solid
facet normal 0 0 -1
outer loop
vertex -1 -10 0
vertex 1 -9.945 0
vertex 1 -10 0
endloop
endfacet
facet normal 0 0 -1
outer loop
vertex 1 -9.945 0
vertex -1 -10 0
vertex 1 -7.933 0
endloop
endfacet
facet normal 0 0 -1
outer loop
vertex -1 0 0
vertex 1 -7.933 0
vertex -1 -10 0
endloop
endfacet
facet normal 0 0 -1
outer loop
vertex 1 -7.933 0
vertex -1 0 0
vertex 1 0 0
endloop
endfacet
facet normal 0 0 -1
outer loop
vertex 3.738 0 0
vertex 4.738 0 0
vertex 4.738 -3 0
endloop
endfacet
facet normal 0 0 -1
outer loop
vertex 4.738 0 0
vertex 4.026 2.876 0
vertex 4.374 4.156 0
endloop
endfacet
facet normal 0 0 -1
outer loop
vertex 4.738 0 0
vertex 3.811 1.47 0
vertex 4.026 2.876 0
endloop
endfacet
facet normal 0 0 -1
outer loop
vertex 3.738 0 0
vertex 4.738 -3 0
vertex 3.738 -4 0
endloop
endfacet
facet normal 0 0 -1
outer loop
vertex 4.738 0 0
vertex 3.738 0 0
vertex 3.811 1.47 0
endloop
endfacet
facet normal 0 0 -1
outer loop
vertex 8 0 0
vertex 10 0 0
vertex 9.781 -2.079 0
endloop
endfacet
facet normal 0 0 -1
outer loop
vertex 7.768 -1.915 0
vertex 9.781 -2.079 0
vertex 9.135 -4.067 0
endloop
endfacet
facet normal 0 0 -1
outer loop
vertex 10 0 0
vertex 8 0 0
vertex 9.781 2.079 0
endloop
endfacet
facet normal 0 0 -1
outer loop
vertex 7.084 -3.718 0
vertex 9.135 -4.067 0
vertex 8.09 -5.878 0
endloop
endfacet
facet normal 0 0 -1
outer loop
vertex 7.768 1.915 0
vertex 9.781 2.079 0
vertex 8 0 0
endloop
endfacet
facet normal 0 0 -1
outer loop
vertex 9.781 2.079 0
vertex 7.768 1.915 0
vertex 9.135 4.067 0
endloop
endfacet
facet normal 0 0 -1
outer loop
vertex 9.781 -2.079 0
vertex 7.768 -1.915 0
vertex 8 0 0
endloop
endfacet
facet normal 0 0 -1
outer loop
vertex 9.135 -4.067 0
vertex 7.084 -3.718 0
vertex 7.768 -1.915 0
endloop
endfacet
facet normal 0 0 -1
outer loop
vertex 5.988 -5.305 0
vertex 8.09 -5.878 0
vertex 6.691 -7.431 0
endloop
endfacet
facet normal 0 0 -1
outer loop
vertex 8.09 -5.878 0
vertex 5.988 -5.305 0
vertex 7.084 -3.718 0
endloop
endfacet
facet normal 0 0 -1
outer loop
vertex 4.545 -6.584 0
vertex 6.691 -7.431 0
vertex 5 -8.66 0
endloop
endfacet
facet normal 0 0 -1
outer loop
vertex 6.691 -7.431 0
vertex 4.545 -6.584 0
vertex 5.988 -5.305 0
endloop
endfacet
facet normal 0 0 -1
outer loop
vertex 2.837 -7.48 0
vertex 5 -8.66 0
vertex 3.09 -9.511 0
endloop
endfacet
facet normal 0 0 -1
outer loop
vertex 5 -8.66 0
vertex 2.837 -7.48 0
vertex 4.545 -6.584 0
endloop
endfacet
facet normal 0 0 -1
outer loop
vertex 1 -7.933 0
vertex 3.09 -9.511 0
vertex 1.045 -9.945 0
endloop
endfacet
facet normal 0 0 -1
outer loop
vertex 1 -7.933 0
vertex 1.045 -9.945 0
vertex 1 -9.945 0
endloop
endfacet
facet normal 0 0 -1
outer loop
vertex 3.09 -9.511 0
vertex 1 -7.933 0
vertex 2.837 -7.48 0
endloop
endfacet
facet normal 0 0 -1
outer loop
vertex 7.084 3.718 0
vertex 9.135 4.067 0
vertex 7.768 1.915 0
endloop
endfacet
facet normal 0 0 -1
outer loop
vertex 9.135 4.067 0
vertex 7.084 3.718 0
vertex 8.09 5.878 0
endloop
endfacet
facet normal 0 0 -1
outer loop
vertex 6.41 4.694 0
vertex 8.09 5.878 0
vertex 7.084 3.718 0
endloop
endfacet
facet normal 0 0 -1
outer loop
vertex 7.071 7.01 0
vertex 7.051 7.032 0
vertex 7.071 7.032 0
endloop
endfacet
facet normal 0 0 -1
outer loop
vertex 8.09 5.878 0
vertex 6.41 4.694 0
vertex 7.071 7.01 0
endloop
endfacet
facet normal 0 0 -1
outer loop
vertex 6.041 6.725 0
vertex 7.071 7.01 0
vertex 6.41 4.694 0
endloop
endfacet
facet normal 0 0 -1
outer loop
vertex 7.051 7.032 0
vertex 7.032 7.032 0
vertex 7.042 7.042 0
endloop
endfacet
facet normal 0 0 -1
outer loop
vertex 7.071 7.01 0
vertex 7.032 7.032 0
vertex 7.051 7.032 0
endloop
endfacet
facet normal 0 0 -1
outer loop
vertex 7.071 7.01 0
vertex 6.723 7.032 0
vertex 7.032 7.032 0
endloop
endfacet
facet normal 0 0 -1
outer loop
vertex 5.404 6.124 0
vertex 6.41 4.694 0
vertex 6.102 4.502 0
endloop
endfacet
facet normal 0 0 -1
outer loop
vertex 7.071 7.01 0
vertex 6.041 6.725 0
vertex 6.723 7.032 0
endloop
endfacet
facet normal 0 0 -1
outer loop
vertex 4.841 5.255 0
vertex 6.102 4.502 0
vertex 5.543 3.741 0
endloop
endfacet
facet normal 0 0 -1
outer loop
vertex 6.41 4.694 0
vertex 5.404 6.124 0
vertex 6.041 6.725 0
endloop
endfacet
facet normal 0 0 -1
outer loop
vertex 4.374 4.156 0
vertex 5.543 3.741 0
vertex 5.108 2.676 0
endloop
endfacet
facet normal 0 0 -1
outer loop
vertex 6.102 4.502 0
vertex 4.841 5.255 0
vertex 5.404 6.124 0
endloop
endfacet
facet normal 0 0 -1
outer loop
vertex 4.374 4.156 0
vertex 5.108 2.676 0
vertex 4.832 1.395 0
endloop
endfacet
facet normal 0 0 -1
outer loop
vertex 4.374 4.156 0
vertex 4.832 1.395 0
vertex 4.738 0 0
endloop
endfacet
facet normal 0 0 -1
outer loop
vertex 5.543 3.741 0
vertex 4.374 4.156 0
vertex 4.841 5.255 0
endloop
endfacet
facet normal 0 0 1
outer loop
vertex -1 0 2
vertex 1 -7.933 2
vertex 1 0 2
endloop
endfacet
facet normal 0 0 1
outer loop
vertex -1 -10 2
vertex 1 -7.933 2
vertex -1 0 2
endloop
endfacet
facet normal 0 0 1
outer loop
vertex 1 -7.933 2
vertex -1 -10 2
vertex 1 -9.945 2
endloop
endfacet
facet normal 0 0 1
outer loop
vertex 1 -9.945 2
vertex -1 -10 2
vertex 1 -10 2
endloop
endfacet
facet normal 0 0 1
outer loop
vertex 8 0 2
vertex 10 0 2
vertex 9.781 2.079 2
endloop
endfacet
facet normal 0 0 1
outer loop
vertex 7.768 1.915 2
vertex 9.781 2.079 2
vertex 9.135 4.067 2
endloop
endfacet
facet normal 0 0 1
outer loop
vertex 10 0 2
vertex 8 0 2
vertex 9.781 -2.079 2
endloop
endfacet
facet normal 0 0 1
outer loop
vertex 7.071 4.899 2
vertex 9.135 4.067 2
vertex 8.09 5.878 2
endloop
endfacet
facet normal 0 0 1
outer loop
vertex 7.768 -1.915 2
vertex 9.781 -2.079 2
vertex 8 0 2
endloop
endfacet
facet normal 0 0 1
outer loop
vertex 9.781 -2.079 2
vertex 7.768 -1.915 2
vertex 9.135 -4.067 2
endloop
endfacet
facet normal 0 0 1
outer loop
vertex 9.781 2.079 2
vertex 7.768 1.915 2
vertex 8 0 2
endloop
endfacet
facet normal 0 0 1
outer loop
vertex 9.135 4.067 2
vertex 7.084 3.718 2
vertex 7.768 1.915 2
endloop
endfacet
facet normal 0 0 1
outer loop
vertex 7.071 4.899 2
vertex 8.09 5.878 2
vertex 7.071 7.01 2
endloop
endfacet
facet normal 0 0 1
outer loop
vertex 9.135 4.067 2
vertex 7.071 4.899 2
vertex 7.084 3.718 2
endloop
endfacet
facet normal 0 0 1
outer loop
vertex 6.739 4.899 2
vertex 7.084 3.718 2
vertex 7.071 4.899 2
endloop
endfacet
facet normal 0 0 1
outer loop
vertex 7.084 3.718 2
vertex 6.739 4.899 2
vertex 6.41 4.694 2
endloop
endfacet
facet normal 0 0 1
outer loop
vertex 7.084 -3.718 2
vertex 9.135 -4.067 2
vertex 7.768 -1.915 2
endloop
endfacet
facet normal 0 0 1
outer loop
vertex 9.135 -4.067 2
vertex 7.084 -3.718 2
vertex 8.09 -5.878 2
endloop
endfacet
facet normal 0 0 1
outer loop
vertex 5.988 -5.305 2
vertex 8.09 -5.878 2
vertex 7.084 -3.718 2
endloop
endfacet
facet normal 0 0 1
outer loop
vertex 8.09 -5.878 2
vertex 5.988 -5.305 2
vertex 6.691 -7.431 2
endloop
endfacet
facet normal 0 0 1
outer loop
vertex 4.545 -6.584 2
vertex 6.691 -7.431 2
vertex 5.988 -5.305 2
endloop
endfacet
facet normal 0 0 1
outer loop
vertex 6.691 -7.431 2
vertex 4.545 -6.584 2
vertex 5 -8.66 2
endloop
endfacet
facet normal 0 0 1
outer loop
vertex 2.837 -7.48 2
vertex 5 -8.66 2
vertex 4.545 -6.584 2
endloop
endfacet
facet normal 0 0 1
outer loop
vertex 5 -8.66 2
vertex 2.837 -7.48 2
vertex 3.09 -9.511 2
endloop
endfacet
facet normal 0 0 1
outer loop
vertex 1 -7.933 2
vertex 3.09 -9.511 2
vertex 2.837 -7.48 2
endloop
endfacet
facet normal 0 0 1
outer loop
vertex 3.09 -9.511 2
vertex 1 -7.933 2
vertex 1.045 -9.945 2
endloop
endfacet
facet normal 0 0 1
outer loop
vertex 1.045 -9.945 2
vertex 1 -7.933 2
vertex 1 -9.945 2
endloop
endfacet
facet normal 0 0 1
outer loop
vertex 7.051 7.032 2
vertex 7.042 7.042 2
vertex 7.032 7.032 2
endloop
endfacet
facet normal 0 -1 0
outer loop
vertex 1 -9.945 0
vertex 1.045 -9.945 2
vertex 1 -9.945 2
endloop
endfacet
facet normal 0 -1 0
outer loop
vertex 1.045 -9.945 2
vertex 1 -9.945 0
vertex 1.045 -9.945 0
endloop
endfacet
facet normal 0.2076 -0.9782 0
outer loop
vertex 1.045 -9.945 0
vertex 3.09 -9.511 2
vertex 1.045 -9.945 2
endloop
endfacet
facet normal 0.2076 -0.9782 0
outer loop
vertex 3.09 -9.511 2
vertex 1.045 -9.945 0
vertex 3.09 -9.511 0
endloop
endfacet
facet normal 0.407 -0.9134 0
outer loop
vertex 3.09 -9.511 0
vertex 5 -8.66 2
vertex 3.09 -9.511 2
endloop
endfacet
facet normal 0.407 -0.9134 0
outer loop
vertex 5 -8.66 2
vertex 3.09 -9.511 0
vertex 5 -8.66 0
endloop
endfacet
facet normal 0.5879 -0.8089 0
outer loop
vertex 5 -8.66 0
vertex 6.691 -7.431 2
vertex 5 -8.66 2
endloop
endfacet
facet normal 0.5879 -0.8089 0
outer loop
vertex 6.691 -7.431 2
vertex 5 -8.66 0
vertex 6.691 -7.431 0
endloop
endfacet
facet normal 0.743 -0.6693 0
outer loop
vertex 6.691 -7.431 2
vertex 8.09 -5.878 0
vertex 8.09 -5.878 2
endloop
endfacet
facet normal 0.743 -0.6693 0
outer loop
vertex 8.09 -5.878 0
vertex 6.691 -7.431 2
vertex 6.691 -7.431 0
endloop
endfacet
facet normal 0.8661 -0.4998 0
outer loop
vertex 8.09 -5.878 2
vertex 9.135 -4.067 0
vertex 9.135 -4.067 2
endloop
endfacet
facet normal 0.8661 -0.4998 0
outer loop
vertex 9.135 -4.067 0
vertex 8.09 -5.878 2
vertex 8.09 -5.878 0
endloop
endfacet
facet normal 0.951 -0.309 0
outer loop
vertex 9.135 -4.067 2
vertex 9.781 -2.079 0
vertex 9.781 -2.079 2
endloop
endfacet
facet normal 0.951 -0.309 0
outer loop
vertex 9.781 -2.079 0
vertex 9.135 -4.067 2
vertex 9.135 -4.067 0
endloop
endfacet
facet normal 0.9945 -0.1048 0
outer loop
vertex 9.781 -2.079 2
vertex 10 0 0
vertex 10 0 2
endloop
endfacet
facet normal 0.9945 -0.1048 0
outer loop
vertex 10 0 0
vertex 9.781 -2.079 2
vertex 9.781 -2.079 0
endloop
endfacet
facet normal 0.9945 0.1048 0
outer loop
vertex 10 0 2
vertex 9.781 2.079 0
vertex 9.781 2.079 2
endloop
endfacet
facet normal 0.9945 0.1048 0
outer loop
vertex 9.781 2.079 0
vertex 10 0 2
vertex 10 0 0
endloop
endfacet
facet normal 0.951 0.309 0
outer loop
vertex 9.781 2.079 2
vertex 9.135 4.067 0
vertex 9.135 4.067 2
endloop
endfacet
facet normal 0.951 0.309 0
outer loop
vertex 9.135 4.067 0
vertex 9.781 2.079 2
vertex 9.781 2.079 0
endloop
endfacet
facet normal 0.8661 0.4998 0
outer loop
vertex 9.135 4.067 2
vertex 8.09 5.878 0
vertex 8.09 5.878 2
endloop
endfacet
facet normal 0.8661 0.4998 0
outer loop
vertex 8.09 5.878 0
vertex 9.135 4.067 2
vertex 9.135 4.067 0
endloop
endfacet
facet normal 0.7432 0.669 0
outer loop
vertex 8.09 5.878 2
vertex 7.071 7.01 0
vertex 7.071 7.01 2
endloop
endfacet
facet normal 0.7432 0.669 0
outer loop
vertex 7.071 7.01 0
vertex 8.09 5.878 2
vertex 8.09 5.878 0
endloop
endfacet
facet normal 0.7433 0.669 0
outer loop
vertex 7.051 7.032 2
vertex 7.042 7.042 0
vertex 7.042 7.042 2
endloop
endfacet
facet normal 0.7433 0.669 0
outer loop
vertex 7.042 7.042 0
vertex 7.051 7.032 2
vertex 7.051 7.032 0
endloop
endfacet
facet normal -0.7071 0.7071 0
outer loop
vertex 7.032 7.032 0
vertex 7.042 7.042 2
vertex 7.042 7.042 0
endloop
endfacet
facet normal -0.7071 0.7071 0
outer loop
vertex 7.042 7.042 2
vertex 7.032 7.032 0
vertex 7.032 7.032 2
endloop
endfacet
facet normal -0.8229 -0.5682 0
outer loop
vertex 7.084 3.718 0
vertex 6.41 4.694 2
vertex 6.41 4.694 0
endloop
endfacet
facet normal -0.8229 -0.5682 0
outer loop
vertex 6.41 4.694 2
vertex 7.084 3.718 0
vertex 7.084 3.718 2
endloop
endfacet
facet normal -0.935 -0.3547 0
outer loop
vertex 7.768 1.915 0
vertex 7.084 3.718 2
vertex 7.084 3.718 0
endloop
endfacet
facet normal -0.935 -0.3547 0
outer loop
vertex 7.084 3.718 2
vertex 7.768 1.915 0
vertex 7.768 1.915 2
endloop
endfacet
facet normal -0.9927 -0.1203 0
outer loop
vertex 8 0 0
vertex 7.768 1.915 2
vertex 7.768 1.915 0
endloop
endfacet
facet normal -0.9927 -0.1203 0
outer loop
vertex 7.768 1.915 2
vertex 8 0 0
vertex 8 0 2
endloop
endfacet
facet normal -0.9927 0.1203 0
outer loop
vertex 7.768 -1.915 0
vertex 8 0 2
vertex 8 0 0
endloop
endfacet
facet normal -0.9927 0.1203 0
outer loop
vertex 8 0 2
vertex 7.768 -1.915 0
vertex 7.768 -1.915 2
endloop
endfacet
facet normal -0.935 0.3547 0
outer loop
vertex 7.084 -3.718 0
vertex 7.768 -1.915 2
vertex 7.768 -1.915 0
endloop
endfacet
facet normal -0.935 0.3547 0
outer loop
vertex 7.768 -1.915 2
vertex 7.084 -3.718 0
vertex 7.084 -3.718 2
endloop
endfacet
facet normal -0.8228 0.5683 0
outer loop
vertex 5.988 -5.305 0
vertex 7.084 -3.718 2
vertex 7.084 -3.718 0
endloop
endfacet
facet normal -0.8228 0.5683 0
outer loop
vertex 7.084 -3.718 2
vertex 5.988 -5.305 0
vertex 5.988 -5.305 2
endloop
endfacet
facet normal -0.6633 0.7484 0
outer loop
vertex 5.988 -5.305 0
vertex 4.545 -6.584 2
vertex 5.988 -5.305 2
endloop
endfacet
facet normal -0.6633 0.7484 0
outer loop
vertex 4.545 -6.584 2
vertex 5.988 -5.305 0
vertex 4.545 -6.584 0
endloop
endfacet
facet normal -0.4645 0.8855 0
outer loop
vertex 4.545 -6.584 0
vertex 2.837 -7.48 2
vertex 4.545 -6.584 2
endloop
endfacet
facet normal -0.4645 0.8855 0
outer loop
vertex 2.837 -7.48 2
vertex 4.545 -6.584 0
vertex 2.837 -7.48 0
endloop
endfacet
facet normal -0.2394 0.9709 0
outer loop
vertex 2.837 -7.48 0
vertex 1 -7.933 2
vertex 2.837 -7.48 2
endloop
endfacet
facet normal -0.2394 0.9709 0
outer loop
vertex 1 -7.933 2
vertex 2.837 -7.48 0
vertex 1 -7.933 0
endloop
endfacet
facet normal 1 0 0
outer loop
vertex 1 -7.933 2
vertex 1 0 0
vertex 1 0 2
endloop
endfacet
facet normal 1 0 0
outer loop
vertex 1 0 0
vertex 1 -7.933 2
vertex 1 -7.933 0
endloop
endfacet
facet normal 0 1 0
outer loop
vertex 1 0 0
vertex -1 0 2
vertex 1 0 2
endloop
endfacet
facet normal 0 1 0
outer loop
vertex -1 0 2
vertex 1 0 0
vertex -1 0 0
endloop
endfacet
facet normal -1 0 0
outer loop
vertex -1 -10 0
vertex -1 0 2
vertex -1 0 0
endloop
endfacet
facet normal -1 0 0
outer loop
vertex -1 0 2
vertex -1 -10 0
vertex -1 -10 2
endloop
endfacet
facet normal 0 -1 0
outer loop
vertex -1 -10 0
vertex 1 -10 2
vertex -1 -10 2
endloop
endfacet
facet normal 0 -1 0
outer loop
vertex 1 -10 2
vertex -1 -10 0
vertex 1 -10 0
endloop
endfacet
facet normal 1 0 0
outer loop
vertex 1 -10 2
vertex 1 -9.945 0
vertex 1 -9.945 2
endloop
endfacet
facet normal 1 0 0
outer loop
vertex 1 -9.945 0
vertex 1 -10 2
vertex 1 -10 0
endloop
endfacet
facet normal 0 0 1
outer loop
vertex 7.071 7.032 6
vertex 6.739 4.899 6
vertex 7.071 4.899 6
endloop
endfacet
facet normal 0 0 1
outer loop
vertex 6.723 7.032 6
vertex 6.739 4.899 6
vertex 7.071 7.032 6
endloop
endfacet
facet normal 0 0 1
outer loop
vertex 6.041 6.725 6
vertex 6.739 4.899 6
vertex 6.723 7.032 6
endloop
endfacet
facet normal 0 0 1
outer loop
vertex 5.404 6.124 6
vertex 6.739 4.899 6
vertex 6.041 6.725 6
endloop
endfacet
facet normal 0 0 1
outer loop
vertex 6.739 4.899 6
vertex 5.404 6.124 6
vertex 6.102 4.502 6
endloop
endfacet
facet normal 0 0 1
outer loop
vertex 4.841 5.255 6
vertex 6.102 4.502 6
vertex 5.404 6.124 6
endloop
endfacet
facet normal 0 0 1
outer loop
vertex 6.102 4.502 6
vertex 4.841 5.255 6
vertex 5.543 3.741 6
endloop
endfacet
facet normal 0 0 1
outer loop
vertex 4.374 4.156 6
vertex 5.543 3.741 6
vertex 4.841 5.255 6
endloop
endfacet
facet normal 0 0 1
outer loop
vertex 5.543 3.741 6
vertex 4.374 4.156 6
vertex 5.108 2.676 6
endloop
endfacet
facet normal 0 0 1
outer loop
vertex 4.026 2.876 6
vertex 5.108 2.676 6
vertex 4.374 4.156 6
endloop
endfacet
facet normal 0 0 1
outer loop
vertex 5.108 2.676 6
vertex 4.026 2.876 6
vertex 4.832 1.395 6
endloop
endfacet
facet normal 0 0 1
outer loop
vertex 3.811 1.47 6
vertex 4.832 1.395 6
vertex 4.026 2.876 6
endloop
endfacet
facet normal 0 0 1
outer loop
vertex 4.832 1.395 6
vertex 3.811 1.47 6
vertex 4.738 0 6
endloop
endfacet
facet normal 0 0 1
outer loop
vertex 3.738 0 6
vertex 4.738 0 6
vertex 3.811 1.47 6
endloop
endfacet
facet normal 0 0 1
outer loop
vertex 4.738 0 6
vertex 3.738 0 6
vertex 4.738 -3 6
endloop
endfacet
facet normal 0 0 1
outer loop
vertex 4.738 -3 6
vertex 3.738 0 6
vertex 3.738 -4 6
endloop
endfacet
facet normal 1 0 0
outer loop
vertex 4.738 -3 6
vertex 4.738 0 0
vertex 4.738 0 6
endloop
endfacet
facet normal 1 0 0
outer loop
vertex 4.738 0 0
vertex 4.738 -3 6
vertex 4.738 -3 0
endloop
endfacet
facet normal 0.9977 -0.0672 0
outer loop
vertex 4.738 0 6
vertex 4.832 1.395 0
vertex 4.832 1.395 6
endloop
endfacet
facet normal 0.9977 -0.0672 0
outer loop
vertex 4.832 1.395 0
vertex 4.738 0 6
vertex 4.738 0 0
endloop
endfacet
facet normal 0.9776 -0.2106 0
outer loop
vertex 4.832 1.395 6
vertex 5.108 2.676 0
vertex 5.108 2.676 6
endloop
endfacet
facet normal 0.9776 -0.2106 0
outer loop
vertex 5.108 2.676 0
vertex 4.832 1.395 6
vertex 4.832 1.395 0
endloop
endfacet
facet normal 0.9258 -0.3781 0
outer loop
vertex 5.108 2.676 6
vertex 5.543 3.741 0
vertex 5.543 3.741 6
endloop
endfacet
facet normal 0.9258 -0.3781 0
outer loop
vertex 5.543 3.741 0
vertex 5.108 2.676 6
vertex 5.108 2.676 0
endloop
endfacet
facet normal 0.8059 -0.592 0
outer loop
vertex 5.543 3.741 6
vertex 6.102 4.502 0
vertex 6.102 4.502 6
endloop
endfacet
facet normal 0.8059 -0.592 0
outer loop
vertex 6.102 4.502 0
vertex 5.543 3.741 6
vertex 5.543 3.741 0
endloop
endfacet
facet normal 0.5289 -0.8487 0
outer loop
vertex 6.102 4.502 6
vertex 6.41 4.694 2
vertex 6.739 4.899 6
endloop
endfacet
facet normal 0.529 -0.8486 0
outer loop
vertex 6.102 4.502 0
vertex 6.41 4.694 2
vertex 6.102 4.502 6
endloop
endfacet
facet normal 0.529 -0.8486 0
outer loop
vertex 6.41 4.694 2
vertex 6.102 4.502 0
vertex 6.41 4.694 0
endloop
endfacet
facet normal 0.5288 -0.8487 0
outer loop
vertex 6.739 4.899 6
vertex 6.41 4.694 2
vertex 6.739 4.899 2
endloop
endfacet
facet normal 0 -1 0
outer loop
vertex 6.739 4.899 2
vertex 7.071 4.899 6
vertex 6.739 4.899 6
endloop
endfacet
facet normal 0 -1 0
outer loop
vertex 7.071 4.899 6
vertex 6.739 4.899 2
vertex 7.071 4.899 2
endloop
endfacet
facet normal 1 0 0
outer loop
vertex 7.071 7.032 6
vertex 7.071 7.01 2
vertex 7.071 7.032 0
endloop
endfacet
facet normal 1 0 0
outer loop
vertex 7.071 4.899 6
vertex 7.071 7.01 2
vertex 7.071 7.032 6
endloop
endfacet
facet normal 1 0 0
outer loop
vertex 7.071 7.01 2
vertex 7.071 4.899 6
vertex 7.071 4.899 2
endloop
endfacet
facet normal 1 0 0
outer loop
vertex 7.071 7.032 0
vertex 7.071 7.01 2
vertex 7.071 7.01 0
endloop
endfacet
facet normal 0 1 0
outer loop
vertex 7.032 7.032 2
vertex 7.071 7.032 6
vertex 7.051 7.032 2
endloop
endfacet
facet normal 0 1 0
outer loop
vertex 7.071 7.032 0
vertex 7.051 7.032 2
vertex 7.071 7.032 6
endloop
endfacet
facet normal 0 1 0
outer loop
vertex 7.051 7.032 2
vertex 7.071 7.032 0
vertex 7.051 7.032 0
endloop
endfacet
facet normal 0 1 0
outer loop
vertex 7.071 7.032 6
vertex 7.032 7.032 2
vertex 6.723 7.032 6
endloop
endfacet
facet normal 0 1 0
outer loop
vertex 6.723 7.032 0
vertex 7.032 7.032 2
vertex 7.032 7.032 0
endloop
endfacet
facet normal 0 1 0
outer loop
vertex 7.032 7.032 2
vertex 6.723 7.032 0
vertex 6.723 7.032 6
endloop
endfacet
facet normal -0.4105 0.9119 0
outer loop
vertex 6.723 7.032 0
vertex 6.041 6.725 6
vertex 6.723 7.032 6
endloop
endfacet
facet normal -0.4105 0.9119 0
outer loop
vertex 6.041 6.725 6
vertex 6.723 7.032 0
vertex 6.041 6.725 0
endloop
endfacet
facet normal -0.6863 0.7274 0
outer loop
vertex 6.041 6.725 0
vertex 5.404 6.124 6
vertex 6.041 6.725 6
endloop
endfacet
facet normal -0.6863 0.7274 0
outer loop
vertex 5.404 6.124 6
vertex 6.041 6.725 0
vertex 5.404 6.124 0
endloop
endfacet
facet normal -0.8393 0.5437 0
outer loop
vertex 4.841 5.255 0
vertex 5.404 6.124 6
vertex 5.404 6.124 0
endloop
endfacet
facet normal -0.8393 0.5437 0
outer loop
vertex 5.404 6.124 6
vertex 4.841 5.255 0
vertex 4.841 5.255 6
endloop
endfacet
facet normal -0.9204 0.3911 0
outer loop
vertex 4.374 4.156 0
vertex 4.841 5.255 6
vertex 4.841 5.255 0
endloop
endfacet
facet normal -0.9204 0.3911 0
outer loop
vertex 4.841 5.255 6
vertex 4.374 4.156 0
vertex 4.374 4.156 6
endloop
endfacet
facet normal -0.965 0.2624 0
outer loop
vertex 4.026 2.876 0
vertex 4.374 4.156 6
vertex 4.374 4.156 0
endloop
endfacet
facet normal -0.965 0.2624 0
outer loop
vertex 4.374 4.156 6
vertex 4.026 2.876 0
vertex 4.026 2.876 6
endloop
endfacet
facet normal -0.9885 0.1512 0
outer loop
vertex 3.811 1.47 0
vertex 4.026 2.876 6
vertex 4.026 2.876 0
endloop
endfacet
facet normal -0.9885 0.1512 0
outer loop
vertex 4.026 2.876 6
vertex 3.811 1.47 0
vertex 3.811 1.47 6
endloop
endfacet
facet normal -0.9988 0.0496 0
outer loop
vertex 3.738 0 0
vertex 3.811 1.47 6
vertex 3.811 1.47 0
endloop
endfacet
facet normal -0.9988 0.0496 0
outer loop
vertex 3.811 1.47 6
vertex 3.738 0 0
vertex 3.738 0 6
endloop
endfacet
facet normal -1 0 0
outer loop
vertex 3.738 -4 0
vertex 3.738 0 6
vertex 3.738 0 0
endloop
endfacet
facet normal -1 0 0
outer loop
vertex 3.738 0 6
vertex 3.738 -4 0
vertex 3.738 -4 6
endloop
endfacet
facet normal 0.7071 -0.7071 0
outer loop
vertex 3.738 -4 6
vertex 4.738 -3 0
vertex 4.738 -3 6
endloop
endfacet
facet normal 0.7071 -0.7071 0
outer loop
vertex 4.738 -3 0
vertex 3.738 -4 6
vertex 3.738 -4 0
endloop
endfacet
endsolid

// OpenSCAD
//
//  Copyright (C) 22-04-2013 Jasper den Ouden.(ojasper.nl)
//
//  This is free software: you can redistribute it and/or modify
//  it under the terms of the GNU General Public License as published
//  by the Free Software Foundation, either version 3 of the License, or
//  (at your option) any later version.
//

//Hmm just bending one way might be nicer..

r =10; t=2;
dev=1;
h=3*t;

module spring_profile()
{
    difference()
    {   circle(r); 
        circle(r-t); 
        translate([-2*r,0]) square(4*r*[1,1],center=true); 
        rotate(-45) translate([-2*r,0]) square(4*r*[1,1],center=true); 
    }
    translate([-t/2,-r]) square([t,r]);//, center=true);
}

module finger_tip()
{   polygon([[0,0], [0,-2*t],[t/2,-3*t/2], [t/2,0]]); }

module from_spring_finger()
{
    translate([r/sqrt(2),0]) 
    {   scale([1/3,1/sqrt(2)]) intersection()
        {   difference(){   circle(r); circle(r-3*t/2); }
            scale([-1,1]) square([r,r]);
        }
        translate([-r/3,0]) finger_tip();
    }
}

module from_wall_finger()
{
    translate([-t/2,-r]) square([t,r+t]);//, center=true);
    translate([r/6+t/2,0]) difference()
    {   
        circle(r/3-t/4);
        circle(r/3-3*t/4); 
        translate(-2*[0,r]) square(4*[r,r],center=true);
    }
    translate([r/2+t/4,0]) scale([-1,1]) finger_tip();
}

module spring_finger()
{
    linear_extrude(height=h/3) spring_profile();
    linear_extrude(height=h) from_spring_finger();
}

spring_finger();

color([0,0,1]) translate([0,0,7*t]) from_wall_finger();
